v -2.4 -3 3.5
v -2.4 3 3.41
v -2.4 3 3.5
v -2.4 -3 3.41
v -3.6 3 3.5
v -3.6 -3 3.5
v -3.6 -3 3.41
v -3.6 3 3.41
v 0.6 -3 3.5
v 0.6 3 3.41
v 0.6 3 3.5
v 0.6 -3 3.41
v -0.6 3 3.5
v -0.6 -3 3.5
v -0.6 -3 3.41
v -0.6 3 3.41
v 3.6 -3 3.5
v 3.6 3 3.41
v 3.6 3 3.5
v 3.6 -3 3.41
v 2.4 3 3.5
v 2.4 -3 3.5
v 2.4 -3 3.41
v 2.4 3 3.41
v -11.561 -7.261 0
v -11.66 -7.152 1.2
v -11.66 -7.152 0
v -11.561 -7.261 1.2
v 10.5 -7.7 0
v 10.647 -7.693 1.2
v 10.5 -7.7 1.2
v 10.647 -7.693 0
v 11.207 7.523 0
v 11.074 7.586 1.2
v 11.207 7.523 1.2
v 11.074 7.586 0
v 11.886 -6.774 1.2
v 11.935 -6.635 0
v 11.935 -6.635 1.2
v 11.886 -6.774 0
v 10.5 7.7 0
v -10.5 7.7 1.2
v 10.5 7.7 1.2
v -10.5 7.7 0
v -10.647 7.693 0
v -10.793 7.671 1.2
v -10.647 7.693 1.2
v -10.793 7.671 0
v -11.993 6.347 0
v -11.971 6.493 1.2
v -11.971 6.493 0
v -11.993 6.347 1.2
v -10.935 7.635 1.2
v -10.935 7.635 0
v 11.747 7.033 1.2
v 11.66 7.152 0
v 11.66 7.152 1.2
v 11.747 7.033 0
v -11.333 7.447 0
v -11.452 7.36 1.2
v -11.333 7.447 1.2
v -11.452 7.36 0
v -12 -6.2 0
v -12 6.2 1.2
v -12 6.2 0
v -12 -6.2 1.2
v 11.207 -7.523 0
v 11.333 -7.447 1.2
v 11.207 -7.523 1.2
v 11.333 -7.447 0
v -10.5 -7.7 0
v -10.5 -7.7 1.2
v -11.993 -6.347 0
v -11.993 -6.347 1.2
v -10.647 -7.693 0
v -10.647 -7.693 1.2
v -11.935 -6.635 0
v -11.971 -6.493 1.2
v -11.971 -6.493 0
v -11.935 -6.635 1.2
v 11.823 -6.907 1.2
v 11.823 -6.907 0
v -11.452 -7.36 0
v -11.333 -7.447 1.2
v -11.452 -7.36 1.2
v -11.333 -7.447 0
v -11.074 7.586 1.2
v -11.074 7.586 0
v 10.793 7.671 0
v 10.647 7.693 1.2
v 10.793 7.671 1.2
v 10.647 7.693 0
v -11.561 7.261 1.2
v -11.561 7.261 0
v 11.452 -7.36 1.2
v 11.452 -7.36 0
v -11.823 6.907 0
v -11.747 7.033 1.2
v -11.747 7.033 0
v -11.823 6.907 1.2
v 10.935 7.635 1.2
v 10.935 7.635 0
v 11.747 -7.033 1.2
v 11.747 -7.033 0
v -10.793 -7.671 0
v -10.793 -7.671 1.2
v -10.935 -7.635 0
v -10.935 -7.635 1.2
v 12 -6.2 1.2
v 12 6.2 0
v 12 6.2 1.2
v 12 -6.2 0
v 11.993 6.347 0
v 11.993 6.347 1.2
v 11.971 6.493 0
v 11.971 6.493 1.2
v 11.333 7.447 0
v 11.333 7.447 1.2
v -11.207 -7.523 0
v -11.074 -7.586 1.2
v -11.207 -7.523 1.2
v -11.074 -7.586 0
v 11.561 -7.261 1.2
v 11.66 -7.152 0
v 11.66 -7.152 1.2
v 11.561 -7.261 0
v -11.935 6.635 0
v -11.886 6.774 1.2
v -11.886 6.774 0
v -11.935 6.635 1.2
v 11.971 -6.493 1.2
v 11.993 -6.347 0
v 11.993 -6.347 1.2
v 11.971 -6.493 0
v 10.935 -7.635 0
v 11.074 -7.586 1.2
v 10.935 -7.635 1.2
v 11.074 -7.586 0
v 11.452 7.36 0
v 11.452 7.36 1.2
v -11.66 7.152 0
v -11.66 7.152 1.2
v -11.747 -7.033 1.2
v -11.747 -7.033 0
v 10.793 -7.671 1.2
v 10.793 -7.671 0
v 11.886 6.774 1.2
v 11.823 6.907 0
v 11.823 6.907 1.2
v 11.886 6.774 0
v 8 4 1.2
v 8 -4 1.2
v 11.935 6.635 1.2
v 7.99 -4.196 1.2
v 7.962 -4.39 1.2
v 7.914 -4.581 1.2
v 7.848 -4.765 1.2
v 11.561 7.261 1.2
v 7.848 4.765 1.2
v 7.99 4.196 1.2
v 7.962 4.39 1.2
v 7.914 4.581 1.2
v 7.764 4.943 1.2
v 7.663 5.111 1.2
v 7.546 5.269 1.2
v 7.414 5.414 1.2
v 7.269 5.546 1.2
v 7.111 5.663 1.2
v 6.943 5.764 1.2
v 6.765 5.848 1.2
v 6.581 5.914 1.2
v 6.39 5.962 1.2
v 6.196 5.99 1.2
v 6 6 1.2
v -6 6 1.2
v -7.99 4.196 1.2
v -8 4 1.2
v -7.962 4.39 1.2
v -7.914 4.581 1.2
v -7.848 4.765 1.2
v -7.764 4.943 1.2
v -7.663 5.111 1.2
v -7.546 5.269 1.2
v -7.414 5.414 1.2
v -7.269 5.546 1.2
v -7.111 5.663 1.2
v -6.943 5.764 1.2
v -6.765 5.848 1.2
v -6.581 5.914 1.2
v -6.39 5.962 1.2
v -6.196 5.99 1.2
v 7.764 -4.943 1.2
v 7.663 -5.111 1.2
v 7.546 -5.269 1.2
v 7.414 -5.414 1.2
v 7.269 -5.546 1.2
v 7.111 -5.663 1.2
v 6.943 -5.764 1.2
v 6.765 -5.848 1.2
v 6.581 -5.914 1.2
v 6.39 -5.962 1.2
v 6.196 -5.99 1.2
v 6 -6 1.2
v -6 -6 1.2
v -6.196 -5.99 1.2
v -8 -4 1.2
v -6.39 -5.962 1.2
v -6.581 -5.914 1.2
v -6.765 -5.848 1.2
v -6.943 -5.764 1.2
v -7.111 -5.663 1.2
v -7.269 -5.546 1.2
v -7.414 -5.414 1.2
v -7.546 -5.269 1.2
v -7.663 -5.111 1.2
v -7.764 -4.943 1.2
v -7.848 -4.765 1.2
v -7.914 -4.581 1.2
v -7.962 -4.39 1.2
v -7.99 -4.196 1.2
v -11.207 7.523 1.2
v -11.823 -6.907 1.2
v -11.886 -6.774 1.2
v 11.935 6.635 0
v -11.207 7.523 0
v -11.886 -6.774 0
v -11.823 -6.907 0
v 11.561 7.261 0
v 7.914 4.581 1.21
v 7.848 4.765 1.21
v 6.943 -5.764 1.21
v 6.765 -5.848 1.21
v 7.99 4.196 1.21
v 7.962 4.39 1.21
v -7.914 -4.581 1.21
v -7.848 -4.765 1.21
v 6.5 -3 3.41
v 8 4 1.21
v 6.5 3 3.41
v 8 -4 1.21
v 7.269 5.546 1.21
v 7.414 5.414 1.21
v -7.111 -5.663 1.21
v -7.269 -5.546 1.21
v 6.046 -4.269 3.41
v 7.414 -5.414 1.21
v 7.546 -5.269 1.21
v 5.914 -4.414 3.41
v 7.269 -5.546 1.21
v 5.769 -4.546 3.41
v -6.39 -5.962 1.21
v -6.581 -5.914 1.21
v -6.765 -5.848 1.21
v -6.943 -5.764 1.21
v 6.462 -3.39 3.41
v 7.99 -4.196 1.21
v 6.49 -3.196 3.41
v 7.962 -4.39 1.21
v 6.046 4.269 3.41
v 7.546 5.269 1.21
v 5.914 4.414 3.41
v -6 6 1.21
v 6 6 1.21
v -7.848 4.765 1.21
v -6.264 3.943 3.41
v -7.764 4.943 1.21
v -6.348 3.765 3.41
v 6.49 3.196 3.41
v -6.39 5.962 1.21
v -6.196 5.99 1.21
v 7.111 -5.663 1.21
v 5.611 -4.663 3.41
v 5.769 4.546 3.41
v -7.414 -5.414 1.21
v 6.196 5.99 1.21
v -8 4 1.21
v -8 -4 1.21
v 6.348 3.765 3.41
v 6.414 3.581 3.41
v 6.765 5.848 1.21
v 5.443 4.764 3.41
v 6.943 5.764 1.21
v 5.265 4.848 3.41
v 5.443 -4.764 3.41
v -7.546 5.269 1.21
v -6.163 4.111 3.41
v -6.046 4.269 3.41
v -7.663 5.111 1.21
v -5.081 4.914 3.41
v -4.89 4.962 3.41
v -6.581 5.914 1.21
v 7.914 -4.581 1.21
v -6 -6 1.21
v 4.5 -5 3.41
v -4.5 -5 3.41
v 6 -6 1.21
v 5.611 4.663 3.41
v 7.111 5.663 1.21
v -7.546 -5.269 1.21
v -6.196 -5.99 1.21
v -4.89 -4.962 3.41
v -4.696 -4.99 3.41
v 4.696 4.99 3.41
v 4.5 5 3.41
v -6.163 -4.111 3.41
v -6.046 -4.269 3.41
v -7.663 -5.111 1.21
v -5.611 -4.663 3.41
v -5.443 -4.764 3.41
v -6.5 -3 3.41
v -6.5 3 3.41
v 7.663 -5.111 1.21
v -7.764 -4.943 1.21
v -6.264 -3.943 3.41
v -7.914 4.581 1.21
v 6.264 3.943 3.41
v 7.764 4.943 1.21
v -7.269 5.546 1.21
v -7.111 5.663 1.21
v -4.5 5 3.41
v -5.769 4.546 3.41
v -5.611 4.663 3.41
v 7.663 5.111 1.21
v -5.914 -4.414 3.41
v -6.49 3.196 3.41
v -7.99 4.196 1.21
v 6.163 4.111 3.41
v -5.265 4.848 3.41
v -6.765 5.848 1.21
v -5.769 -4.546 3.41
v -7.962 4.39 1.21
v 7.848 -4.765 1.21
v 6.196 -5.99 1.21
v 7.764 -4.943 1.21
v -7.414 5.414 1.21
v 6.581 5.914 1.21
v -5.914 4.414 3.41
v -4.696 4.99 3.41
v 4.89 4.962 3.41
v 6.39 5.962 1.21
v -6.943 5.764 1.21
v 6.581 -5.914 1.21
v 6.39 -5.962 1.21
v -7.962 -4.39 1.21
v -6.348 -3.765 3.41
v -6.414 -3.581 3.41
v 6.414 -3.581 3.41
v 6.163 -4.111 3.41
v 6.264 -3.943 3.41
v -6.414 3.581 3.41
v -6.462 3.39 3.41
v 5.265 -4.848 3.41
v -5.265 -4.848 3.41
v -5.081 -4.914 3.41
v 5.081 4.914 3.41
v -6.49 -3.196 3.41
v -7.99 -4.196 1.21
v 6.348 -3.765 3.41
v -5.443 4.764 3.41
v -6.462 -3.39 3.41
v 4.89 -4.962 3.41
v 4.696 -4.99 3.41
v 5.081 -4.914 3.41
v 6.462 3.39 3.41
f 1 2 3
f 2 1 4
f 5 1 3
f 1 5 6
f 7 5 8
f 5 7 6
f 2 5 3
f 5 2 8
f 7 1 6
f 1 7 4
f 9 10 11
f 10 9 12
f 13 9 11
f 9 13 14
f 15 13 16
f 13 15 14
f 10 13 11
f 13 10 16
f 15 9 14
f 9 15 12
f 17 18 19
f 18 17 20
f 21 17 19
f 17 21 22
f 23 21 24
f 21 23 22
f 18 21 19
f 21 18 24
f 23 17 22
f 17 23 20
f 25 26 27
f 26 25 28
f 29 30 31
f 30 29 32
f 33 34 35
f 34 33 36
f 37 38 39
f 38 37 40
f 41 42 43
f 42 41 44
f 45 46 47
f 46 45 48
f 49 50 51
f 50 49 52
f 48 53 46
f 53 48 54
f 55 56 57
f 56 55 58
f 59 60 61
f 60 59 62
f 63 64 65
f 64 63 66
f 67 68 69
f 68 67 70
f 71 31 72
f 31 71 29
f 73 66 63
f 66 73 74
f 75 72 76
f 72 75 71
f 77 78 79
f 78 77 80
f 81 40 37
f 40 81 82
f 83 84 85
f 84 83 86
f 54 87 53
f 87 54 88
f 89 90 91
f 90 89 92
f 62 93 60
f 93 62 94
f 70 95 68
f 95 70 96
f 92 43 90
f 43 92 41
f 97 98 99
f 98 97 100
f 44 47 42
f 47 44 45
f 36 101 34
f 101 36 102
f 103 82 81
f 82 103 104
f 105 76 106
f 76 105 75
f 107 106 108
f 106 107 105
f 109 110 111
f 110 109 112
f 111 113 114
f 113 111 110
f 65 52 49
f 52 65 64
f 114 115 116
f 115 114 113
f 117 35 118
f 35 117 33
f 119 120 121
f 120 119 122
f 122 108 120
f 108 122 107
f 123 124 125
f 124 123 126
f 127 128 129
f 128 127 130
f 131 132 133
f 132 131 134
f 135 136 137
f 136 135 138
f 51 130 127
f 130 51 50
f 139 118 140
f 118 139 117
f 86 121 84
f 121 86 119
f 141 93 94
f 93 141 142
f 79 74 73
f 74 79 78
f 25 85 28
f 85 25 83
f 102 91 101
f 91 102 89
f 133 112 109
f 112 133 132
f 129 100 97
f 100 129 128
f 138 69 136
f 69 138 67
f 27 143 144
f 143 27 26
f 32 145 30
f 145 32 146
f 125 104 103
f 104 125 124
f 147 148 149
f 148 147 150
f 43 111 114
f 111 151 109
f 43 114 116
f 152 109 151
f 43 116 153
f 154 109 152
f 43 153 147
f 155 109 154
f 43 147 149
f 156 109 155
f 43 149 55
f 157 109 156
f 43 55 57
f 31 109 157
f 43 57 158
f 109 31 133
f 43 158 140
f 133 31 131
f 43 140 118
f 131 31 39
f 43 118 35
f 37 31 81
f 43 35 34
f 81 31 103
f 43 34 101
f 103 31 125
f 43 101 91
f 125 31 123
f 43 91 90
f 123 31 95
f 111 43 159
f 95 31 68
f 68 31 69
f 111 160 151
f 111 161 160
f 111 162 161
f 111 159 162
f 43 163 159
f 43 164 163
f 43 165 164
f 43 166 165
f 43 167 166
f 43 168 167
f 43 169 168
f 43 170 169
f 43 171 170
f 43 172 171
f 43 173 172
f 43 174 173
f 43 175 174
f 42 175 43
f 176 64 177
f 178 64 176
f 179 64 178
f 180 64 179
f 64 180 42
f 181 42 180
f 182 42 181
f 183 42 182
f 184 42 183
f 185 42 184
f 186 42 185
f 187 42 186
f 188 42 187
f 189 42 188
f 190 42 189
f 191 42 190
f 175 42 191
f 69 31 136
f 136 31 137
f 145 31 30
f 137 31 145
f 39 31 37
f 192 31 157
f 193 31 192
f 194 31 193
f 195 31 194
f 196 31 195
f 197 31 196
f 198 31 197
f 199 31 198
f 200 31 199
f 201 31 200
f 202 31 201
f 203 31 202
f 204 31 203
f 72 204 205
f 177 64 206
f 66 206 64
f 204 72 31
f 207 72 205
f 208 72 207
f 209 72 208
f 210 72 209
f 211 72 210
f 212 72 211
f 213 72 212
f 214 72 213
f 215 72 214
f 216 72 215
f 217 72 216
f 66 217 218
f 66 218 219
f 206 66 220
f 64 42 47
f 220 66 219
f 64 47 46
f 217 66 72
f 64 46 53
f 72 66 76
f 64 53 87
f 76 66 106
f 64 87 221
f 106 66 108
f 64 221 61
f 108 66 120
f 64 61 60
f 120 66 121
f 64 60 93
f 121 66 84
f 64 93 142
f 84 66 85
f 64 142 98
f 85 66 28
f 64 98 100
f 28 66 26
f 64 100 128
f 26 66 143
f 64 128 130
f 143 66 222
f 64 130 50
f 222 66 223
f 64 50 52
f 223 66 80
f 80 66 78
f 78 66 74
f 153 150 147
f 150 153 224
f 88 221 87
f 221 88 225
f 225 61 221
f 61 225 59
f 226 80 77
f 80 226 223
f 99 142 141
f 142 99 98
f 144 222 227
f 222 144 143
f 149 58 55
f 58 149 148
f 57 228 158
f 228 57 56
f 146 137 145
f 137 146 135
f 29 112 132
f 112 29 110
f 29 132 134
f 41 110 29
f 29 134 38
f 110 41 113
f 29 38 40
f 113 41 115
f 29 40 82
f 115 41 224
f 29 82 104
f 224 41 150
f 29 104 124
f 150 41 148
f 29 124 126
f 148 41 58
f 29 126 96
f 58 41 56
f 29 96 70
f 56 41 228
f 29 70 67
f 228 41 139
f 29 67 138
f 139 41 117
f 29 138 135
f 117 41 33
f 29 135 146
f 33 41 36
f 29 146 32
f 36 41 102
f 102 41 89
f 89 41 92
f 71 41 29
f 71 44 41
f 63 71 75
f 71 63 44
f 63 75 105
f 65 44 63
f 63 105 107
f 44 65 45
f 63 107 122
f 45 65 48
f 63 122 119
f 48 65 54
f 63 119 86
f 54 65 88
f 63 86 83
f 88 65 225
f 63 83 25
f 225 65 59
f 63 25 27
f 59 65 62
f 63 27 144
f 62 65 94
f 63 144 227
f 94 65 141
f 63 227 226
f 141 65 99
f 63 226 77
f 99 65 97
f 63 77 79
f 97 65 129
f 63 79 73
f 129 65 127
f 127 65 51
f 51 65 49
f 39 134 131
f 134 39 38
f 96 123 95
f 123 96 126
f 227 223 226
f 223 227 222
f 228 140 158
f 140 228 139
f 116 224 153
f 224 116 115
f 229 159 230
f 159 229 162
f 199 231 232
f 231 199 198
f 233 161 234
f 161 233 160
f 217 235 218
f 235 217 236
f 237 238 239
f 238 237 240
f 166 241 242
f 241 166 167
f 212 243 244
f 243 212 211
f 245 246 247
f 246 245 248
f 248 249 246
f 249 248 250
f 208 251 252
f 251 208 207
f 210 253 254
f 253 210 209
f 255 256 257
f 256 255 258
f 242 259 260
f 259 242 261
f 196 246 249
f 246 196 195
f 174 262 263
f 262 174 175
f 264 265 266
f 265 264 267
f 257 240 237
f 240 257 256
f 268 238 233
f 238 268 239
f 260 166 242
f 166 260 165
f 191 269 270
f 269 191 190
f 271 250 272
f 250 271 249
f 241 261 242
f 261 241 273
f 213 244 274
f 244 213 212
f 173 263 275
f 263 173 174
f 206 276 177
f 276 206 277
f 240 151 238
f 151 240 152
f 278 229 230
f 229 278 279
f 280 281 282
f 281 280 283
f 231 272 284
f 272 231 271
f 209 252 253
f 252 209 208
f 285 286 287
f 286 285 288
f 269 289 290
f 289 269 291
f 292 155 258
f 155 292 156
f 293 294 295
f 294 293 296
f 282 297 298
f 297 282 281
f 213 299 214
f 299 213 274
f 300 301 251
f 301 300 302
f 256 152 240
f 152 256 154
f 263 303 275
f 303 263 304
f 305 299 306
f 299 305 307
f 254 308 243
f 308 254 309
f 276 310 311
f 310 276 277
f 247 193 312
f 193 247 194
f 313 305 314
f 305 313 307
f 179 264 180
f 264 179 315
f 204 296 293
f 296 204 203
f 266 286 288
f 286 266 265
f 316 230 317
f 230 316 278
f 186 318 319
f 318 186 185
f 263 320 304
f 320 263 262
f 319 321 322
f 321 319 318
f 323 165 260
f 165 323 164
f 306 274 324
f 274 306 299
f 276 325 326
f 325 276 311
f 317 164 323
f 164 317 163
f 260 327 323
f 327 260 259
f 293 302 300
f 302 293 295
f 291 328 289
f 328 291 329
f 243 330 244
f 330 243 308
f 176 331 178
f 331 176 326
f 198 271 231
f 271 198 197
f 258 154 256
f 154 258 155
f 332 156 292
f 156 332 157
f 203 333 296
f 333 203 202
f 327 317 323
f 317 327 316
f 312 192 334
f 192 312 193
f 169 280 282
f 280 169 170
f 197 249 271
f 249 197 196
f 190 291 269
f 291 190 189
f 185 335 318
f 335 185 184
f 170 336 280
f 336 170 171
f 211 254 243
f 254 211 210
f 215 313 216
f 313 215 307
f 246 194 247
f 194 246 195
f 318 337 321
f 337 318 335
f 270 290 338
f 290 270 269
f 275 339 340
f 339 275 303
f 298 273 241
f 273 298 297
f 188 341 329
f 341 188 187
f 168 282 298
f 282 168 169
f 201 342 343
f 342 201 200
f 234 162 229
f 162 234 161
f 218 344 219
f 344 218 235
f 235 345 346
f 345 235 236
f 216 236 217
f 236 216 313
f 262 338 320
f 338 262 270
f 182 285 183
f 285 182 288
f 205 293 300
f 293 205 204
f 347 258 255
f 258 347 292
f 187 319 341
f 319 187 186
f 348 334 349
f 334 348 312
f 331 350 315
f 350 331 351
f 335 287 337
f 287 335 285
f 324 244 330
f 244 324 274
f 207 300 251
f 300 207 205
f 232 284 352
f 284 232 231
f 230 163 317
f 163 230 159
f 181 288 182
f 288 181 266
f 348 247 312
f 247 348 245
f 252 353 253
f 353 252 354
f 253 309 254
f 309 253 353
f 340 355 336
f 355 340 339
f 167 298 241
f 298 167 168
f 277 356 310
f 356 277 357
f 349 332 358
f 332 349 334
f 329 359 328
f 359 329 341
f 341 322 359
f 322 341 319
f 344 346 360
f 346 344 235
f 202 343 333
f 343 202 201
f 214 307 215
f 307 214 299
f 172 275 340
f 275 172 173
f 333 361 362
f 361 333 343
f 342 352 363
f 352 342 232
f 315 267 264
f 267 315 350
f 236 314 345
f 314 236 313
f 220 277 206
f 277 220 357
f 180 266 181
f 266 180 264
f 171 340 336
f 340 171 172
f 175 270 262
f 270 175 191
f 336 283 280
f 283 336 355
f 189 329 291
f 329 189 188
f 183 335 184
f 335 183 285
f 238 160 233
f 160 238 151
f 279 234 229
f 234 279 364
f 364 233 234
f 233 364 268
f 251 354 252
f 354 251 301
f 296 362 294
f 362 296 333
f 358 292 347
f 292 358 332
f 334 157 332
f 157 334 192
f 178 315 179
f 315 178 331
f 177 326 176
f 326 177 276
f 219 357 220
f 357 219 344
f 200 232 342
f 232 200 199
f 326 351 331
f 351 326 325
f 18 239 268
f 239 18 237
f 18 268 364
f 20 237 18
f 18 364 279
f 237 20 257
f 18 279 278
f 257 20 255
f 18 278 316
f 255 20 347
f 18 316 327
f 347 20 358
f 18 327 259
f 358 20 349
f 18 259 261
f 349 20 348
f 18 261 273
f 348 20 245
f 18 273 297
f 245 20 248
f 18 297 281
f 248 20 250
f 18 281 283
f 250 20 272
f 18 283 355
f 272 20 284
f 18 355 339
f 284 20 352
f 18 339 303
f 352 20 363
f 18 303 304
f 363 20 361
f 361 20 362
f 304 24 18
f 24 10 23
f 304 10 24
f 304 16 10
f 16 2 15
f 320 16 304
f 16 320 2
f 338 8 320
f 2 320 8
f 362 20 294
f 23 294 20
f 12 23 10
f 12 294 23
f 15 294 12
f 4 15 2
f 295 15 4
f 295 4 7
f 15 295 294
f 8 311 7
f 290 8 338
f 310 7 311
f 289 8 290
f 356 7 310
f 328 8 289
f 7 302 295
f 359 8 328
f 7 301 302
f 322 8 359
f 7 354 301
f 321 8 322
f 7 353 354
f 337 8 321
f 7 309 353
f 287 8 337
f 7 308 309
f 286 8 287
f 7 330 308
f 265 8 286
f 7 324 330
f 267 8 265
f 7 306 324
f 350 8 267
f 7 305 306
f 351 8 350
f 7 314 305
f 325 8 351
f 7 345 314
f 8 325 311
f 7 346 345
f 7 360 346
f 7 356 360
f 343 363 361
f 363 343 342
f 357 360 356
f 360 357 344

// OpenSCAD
// file: ../../sorgenti/libreria.scad
// ============================================================
// libreria.scad — forme di base riusate da tutti i pezzi
// ============================================================
include <parametri.scad>

$fn = RISOLUZIONE;

// Prisma a sezione rettangolare con angoli arrotondati.
module piastra(x, y, h, r) {
    linear_extrude(height = h)
        offset(r = r) square([x - 2*r, y - 2*r], center = true);
}

// Scatola piena con angoli verticali arrotondati (rv) e bordo
// superiore raccordato (rt). Il raccordo è approssimato a gradini
// uniti con hull(): resta liscio e si stampa senza supporti.
module scatola_arrotondata(x, y, z, rv, rt, passi = 12) {
    union() {
        piastra(x, y, z - rt, rv);
        for (i = [0 : passi - 1]) {
            a0 = 90 * i / passi;
            a1 = 90 * (i + 1) / passi;
            k0 = rt * (1 - cos(a0));  k1 = rt * (1 - cos(a1));
            h0 = rt * sin(a0);        h1 = rt * sin(a1);
            hull() {
                translate([0, 0, z - rt + h0])
                    piastra(x - 2*k0, y - 2*k0, 0.02, max(rv - k0, 0.6));
                translate([0, 0, z - rt + h1])
                    piastra(x - 2*k1, y - 2*k1, 0.02, max(rv - k1, 0.6));
            }
        }
    }
}

// Foro di passaggio per vite con svasatura della testa (testa in basso,
// si avvita dal basso verso l'alto).
module foro_svasato(h = 10, d = VITE_FORO, testa_d = VITE_TESTA_D, testa_h = 1.6) {
    translate([0, 0, -0.1]) cylinder(h = h + 0.2, d = d);
    translate([0, 0, -0.1]) cylinder(h = testa_h + 0.1, d1 = testa_d, d2 = d);
}

// Pilastrino con sede per inserto a caldo M2,5 (si inserisce dal basso).
module boss_inserto(h = 12, d = BOSS_D) {
    difference() {
        cylinder(h = h, d = d);
        translate([0, 0, -0.1]) cylinder(h = INSERTO_H + 0.1, d = INSERTO_D);
        // scarico sopra l'inserto, per la punta della vite
        translate([0, 0, INSERTO_H]) cylinder(h = h, d = VITE_D + 0.4);
    }
}

// Griglia di fori a nido d'ape dentro un cerchio di diametro d_area.
module griglia_tonda(d_area, spessore, d_foro = ALT_GRIGLIA_D, passo = 3.2) {
    n = ceil(d_area / passo) + 2;
    for (i = [-n : n], j = [-n : n]) {
        x = i * passo + (abs(j) % 2) * passo / 2;
        y = j * passo * 0.866;
        if (sqrt(x*x + y*y) <= (d_area - d_foro) / 2)
            translate([x, y, -0.1]) cylinder(h = spessore + 0.2, d = d_foro);
    }
}

// Fessura allungata (slot) con estremi arrotondati, asse X.
module fessura(lung, larg, h) {
    hull() {
        translate([-(lung - larg)/2, 0, 0]) cylinder(h = h, d = larg);
        translate([ (lung - larg)/2, 0, 0]) cylinder(h = h, d = larg);
    }
}

// Scritta in rilievo (per i provini e le etichette).
module scritta(t, dim = 6, alt = 0.6) {
    linear_extrude(height = alt)
        text(t, size = dim, halign = "center", valign = "center",
             font = "Helvetica:style=Bold");
}

// Freccia piena, punta verso +X, usata per le icone dei tasti.
module freccia(lung = 16, larg = 14, alt = 0.8) {
    gambo = larg / 5;          // mezza larghezza del gambo
    testa = lung * 0.45;       // lunghezza della punta
    linear_extrude(height = alt)
        polygon([[-lung/2, -gambo], [lung/2 - testa, -gambo],
                 [lung/2 - testa, -larg/2], [lung/2, 0],
                 [lung/2 - testa, larg/2], [lung/2 - testa, gambo],
                 [-lung/2, gambo]]);
}

// Icona "volume": tre barrette crescenti, asse X.
module icona_volume(n = 3, alt = 0.8, passo = 3.2, base = 2.0, cresc = 1.6) {
    for (i = [0 : n - 1])
        translate([i * passo, 0, 0])
            linear_extrude(height = alt)
                square([1.8, base + i * cresc], center = true);
}

// Cava a sezione rettangolare arrotondata, asse di estrusione Y.
// Utile per finestre e fessure nelle pareti verticali.
module cava_y(x, z, prof, r = 1.5) {
    rotate([90, 0, 0])
        linear_extrude(height = prof, center = true)
            offset(r = r) square([x - 2*r, z - 2*r], center = true);
}

// Pilastrino che parte dal piano del fondo e ospita un inserto a caldo
// (inserito dal basso). La punta conica in alto lo rende stampabile
// anche a scatola capovolta.
module boss_fondo(h = 12) {
    union() {
        difference() {
            cylinder(h = h, d = BOSS_D);
            translate([0, 0, -0.1]) cylinder(h = INSERTO_H + 0.1, d = INSERTO_D);
            translate([0, 0, INSERTO_H]) cylinder(h = h, d = VITE_D + 0.6);
        }
        translate([0, 0, h]) cylinder(h = BOSS_D/2, d1 = BOSS_D, d2 = 0.4);
    }
}

// Pilastrino appeso al soffitto (coperchio): l'inserto entra dal basso.
module boss_soffitto(h = 7) {
    difference() {
        translate([0, 0, -h]) cylinder(h = h, d = BOSS_D);
        translate([0, 0, -h - 0.1]) cylinder(h = INSERTO_H + 0.1, d = INSERTO_D);
    }
}

// Maschio della coda di rondine: si infila nella cava della fiancata.
// Si stampa in verticale insieme al raccoglitore, quindi senza supporti.
module coda_maschio(altezza) {
    gioco = 0.35;
    rotate([-90, 0, 0])
        linear_extrude(height = altezza)
            polygon([[0, -(CODA_FONDO - gioco)/2], [0, (CODA_FONDO - gioco)/2],
                     [CODA_PROF - 0.3, (CODA_BOCCA - gioco)/2],
                     [CODA_PROF - 0.3, -(CODA_BOCCA - gioco)/2]]);
}
// main file
// ============================================================
// sportello-usb.scad — porticina della presa di ricarica
// ------------------------------------------------------------
// Scorre nella cava sul retro e non si sfila: la cava interna è
// più alta della fessura a vista, quindi la piastrina resta
// prigioniera. Si monta una volta sola, inclinandola per farla
// entrare dalla fessura.
//
// Perché scorrevole e non un tappo: un tappo si perde, e passa
// dal calibro delle parti piccole (Ø31,7). Questa no, perché non
// esce dal box.
//
// STAMPA: appoggiata, bottoncino verso l'alto. Niente supporti.
// Se scorre dura, 0,1 mm in meno di SPORT_SPESS e si rifà: sono
// cinque minuti di stampa.
// ============================================================
include <../../sorgenti/libreria.scad>

sportello();

module sportello() {
    altezza = SPORT_GOLA - 0.6;      // gioco nella cava
    lung = SPORT_PIASTRA_L;
    union() {
        // piastrina che corre nella gola
        linear_extrude(height = SPORT_SPESS)
            offset(r = 1.5) square([lung - 3, altezza - 3], center = true);
        // bottoncino che sporge dalla fessura: è la presa per il dito
        translate([0, 0, SPORT_SPESS - 0.01])
            hull() {
                linear_extrude(height = 0.02)
                    offset(r = 2) square([12, SPORT_APERTURA - 5], center = true);
                translate([0, 0, SPORT_PRESA])
                    linear_extrude(height = 0.02)
                        offset(r = 2) square([9, SPORT_APERTURA - 7], center = true);
            }
        // tre righine antiscivolo sul bottoncino
        for (i = [-1, 0, 1])
            translate([i * 3, 0, SPORT_SPESS + SPORT_PRESA - 0.3])
                cube([1.2, SPORT_APERTURA - 7, 0.8], center = true);
    }
}
